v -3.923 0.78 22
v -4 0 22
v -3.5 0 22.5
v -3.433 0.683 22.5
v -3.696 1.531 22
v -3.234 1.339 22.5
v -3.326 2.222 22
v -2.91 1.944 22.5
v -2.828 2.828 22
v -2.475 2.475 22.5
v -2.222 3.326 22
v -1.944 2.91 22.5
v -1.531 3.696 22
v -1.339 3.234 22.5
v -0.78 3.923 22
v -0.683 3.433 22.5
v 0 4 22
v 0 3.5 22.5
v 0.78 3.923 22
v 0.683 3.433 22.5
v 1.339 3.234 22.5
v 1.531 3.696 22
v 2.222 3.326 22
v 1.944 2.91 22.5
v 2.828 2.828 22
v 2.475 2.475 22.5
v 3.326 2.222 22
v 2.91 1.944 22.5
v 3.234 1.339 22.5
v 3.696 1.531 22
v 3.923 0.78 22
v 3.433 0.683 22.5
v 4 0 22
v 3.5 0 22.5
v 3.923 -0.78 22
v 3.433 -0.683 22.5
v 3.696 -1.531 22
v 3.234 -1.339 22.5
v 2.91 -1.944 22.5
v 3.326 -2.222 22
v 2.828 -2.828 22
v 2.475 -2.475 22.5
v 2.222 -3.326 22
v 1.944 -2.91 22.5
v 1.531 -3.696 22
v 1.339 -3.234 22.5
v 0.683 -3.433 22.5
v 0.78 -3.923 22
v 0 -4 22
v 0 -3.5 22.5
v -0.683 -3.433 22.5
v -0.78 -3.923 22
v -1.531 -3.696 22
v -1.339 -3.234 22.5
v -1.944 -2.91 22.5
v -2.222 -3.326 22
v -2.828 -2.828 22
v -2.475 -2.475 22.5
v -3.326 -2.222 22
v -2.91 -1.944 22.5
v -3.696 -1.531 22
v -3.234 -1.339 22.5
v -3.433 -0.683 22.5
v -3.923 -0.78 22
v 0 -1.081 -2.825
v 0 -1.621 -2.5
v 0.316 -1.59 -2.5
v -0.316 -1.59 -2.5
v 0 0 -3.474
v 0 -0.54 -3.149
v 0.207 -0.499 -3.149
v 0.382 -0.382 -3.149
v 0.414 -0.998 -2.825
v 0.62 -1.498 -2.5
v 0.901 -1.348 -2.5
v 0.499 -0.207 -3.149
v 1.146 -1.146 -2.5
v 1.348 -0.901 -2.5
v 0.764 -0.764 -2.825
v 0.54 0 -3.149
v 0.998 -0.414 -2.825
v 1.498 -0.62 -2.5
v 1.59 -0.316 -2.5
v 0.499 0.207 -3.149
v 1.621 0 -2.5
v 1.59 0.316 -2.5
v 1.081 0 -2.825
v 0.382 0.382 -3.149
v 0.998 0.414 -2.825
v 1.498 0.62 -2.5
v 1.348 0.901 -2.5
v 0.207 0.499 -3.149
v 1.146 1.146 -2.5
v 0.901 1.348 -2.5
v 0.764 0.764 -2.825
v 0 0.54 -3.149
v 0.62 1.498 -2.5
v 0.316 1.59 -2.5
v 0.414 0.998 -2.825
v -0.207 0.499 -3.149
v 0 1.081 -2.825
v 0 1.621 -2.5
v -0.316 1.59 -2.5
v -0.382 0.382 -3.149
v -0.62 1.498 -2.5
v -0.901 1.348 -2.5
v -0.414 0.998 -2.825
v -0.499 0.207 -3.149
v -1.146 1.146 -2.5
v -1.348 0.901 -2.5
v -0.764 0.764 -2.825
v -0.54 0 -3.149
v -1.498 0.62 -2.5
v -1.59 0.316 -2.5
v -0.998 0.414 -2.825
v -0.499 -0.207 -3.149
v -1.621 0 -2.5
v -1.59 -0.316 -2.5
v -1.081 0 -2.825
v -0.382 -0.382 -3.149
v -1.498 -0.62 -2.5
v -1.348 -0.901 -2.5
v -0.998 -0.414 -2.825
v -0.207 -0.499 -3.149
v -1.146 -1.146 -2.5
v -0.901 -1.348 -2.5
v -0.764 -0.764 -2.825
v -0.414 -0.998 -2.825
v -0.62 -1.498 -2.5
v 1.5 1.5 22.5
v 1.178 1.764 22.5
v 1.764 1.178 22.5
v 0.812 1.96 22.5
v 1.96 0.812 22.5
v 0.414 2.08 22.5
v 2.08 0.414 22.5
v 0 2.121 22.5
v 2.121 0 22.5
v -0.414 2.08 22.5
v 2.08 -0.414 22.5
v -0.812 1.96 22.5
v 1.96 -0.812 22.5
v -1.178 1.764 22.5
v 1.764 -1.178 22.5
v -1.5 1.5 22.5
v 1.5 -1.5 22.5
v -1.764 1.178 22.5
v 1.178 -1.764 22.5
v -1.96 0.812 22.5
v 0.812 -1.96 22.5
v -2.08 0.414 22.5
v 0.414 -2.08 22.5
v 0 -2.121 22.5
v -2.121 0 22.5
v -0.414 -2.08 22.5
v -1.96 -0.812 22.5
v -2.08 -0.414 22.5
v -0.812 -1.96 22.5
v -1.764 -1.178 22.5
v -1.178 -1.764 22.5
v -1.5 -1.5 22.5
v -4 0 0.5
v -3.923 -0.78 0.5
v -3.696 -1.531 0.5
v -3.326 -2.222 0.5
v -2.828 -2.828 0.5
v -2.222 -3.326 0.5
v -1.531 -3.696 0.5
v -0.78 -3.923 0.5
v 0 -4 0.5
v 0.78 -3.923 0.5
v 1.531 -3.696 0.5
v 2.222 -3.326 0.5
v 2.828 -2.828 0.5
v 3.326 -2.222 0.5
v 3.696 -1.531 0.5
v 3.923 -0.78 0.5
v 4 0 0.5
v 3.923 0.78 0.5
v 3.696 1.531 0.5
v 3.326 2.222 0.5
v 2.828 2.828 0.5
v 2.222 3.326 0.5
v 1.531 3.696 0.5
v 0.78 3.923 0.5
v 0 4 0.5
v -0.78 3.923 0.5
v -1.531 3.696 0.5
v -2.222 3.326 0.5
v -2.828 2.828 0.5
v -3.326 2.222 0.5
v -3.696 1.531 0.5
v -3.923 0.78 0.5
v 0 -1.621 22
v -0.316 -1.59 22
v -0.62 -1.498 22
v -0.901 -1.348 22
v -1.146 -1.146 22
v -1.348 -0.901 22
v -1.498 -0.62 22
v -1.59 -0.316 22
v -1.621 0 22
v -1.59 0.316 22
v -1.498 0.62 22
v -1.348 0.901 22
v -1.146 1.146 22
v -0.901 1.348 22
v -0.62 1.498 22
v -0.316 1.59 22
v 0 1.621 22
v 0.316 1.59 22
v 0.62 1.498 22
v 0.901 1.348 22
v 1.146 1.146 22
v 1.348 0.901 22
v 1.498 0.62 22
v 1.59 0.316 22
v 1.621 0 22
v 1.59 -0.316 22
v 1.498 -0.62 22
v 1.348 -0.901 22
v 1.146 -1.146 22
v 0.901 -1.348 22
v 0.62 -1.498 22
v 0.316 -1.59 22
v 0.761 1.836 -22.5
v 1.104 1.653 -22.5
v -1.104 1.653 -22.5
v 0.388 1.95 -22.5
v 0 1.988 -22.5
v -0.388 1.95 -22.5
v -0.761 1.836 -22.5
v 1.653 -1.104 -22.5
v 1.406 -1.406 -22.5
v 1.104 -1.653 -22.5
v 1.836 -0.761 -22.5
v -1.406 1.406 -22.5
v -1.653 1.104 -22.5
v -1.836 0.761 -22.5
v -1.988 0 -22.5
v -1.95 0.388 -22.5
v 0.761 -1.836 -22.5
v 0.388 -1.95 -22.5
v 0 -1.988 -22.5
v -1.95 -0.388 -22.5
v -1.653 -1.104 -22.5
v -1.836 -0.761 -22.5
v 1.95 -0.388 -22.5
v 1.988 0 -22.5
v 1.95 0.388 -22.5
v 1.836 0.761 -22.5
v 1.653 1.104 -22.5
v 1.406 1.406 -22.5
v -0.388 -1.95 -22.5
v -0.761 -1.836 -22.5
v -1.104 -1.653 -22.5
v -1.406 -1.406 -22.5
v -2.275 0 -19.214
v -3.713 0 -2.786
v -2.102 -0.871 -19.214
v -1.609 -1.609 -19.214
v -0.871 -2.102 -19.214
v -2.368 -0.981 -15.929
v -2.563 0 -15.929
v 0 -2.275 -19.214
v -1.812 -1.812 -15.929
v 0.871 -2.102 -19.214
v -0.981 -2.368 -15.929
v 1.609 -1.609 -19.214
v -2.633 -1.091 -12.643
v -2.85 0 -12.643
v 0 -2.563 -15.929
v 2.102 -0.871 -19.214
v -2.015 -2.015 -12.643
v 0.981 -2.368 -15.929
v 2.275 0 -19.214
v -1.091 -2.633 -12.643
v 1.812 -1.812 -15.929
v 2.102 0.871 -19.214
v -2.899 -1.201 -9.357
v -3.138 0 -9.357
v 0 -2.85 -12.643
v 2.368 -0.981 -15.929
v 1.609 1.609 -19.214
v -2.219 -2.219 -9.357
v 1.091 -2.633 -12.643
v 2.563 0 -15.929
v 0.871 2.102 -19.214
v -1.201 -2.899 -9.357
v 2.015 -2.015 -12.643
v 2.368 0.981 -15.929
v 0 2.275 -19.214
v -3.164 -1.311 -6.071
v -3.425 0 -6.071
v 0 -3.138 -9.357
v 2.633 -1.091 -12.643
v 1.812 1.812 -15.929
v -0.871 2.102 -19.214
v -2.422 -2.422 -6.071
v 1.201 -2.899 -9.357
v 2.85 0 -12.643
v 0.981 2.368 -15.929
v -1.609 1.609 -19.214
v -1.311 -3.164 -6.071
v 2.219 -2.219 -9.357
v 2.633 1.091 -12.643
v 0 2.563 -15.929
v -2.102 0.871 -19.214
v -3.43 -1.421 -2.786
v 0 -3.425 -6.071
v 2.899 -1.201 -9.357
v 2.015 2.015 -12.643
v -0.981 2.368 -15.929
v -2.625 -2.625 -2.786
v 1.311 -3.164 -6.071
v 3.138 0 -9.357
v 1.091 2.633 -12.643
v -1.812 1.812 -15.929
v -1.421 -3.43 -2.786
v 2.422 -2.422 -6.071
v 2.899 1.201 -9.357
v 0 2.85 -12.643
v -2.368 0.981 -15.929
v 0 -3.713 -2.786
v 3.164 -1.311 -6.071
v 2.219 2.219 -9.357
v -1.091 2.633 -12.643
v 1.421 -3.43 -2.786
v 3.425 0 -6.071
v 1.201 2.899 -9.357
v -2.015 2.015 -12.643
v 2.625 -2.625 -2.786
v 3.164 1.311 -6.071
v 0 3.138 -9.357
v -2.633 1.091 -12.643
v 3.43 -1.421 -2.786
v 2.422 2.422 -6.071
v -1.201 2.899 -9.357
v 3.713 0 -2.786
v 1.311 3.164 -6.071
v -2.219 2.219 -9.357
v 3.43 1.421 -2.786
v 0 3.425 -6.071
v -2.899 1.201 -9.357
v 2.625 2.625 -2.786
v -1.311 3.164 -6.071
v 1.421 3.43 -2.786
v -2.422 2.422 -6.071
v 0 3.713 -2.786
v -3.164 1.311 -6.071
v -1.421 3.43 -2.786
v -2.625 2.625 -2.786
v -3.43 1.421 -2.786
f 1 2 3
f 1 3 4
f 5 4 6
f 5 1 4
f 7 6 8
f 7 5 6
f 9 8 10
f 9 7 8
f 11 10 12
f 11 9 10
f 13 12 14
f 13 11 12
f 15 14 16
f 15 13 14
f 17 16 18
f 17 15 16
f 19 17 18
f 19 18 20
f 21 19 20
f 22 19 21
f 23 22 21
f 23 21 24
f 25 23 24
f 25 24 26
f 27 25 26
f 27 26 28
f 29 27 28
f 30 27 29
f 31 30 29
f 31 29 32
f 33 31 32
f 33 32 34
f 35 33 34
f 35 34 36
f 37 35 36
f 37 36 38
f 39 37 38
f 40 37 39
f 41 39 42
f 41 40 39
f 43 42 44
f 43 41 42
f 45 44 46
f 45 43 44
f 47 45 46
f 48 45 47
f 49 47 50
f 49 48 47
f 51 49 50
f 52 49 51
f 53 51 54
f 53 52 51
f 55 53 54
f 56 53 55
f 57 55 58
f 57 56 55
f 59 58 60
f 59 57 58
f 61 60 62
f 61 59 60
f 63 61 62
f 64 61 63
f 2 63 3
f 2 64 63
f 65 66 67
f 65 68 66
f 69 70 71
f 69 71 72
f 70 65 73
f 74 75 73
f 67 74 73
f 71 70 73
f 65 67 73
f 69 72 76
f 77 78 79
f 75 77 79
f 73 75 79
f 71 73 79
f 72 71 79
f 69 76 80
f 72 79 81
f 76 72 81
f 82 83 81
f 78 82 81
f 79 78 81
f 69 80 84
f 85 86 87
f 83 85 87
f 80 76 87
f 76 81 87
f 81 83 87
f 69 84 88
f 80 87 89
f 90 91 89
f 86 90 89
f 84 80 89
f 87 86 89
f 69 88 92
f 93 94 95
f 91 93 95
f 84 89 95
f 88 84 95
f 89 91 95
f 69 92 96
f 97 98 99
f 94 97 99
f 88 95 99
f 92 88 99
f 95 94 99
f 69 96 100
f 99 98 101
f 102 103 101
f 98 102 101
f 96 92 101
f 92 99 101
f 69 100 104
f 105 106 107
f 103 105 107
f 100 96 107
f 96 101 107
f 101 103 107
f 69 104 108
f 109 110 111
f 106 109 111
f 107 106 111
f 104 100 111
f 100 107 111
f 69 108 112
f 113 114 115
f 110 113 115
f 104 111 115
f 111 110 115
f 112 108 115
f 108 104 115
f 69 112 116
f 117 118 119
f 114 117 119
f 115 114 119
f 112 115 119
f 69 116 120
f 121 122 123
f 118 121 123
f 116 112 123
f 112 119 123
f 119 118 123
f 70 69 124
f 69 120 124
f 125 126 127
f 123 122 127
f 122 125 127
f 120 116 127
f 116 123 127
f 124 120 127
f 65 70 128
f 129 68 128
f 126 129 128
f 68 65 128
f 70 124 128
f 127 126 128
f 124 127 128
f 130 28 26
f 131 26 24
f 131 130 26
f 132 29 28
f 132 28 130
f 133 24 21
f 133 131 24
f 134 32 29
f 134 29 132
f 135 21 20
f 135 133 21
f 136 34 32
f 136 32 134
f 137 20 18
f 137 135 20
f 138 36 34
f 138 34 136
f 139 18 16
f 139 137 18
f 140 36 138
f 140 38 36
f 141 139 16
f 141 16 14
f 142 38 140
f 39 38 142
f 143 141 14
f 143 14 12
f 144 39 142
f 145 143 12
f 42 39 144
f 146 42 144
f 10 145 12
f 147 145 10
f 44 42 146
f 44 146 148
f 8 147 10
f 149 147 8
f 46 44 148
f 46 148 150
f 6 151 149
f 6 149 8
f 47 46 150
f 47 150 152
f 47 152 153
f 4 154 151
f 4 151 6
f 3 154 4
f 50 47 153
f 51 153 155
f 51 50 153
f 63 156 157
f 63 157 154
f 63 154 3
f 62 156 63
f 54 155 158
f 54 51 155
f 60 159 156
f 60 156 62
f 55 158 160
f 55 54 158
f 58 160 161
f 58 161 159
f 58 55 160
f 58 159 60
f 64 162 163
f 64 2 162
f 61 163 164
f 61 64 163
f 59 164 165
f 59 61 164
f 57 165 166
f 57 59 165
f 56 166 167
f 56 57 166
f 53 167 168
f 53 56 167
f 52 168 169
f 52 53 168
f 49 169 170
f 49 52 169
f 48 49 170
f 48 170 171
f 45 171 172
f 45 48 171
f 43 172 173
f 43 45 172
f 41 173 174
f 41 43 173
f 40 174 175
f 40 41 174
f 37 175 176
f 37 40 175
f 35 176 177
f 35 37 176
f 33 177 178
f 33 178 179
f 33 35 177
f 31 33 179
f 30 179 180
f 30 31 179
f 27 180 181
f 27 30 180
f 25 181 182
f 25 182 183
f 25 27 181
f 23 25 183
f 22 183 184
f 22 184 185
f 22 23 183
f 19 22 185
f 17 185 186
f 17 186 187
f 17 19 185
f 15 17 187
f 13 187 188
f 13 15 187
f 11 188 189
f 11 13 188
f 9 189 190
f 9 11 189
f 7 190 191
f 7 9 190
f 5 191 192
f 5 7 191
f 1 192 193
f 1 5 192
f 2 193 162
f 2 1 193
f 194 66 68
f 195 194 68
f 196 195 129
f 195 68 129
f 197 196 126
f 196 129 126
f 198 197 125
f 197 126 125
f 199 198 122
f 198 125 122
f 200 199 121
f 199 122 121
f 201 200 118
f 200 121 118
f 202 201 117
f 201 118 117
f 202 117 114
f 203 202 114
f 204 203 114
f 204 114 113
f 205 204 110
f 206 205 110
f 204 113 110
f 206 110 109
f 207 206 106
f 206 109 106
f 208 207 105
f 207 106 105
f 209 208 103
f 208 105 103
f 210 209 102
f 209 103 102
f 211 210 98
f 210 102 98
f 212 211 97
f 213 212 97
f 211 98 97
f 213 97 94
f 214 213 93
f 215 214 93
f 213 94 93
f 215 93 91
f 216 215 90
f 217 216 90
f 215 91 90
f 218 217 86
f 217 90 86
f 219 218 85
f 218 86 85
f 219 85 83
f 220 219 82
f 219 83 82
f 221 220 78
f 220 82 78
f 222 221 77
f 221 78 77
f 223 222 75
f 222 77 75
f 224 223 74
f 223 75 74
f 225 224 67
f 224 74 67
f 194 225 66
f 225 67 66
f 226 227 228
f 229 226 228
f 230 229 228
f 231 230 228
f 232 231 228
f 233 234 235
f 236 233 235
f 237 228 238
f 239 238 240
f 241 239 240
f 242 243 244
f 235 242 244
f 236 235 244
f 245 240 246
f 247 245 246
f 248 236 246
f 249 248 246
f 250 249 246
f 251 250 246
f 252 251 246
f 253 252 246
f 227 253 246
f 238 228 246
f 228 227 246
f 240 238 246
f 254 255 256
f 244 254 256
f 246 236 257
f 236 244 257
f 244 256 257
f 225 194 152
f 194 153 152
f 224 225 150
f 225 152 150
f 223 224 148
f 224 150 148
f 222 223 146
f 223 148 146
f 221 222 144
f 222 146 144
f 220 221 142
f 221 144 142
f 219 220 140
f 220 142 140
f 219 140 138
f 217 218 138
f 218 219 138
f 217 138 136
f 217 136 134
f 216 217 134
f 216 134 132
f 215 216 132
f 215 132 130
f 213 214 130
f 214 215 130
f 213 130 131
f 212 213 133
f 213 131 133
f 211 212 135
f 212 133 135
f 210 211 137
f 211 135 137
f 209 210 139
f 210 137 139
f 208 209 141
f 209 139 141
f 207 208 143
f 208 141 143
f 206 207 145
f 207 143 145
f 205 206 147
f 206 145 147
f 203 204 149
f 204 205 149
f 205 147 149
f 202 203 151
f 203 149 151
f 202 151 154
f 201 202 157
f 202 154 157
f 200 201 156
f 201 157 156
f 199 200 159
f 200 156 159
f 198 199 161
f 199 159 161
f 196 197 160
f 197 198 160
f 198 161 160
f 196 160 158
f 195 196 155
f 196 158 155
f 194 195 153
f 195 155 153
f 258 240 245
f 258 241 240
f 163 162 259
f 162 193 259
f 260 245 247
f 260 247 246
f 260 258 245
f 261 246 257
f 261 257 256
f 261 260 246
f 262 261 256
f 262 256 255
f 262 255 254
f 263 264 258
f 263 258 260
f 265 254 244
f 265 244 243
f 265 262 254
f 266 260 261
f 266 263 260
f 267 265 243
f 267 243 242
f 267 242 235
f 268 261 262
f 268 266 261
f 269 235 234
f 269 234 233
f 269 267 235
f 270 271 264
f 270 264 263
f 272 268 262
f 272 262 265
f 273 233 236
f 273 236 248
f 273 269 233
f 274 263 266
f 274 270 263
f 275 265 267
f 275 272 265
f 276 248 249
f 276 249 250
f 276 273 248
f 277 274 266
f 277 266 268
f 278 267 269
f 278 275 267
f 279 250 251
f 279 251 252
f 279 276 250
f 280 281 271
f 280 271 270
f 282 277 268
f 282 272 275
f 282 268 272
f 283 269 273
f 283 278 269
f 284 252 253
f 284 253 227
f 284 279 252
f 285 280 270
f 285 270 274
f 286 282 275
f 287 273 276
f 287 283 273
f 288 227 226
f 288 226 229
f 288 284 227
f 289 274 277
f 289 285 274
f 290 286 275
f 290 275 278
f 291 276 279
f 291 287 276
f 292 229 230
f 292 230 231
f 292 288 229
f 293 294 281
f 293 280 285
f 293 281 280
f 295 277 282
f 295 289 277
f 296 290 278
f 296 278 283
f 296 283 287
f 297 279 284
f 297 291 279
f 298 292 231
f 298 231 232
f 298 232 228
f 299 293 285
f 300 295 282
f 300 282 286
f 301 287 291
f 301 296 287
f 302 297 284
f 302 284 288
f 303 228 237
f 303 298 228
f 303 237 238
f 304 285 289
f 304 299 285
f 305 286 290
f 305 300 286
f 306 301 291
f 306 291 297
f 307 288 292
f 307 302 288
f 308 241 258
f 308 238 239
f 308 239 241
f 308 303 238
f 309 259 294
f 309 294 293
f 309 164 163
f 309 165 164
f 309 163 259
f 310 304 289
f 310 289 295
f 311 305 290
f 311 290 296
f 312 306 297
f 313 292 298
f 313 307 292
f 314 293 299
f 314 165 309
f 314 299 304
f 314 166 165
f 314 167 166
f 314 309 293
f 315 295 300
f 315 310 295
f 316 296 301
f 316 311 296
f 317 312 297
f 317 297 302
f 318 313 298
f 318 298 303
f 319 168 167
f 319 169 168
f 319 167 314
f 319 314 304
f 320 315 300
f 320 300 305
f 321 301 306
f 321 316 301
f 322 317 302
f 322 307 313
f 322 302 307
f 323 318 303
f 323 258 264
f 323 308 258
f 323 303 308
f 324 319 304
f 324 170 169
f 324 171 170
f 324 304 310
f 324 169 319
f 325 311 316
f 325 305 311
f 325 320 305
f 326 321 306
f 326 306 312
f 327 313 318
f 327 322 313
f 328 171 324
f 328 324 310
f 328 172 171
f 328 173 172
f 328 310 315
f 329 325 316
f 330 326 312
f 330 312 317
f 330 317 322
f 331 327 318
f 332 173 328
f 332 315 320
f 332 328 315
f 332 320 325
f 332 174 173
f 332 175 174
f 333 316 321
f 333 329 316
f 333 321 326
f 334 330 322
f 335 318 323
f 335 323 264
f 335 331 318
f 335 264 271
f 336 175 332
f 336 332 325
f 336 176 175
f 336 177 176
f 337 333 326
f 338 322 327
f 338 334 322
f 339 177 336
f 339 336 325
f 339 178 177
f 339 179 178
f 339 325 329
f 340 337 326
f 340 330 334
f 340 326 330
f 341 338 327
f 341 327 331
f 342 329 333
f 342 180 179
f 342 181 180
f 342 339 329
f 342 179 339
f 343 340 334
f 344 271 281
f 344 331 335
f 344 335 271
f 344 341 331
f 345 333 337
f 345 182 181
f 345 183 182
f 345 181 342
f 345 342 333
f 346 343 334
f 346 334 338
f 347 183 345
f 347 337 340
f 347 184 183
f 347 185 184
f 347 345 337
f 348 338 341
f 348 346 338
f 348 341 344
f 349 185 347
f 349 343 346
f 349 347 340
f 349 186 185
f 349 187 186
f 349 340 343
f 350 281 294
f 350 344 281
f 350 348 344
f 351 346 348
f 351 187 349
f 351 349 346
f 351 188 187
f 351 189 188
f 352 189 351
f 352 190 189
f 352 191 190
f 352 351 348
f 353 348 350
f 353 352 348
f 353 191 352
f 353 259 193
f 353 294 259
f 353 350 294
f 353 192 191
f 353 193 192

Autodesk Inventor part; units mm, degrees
ref_plane "YZ Plane" through (0, 0, 0) normal (1, 0, 0) x (0, 1, 0)
ref_plane "XZ Plane" through (0, 0, 0) normal (0, 1, 0) x (-1, 0, 0)
ref_plane "XY Plane" through (0, 0, 0) normal (0, 0, 1) x (1, 0, 0)
sketch "Sketch1" plane through (0, 0, 0) normal (0, 1, 0) x (-1, 0, 0)
  line L0 (4.8, 0) -> (-0.8, 0) construction
  line L1 (0, -37.7337) -> (0, 68.9023) construction
  line L2 (4, 22.5) -> (0, 22.5)
  line L3 (0, 22.5) -> (0, -22.5)
  line L4 (0, -22.5) -> (4, -22.5)
  line L5 (4, -22.5) -> (4, 22.5)
  line L6 (4, 53.6686) -> (4, 38.3314)
  line L7 (1.9878, -22.5) -> (4, 0.5)
  point P0 (0, 0)
  point P1 (0, 22.5)
  point P2 (0, -22.5)
  dimension "d2" = 8
  dimension "d5" = 23
  dimension "d21" = 45
  dimension "d22" = 3.9755
  dimension "d23" = 5
revolve "Revolution1" add sketch "Sketch1" angle 360 about axis through (0, 0, -10) along (0, 0, 1) contours L5 L7 L4 L3 L2
sketch "Sketch2" plane through (0, 0, 22.5) normal (0, 0, 1) x (1, 0, 0)
  circle A0 centre (0, 0) radius 4 projected
hole "Hole1" at (0, 0, 22.5) direction (0, 0, -1) diameter 3.242 depth 25 tip angle 118 thread size "M4x0.7" class "6H" standard "ISO Metric profile"
chamfer "Chamfer1" distance 0.5 angle 45 2 edges at (4, 0, 22.5) (0, 1.621, 22.5)
properties part number "DLT-01-238B" material "Poliacetal WT"
